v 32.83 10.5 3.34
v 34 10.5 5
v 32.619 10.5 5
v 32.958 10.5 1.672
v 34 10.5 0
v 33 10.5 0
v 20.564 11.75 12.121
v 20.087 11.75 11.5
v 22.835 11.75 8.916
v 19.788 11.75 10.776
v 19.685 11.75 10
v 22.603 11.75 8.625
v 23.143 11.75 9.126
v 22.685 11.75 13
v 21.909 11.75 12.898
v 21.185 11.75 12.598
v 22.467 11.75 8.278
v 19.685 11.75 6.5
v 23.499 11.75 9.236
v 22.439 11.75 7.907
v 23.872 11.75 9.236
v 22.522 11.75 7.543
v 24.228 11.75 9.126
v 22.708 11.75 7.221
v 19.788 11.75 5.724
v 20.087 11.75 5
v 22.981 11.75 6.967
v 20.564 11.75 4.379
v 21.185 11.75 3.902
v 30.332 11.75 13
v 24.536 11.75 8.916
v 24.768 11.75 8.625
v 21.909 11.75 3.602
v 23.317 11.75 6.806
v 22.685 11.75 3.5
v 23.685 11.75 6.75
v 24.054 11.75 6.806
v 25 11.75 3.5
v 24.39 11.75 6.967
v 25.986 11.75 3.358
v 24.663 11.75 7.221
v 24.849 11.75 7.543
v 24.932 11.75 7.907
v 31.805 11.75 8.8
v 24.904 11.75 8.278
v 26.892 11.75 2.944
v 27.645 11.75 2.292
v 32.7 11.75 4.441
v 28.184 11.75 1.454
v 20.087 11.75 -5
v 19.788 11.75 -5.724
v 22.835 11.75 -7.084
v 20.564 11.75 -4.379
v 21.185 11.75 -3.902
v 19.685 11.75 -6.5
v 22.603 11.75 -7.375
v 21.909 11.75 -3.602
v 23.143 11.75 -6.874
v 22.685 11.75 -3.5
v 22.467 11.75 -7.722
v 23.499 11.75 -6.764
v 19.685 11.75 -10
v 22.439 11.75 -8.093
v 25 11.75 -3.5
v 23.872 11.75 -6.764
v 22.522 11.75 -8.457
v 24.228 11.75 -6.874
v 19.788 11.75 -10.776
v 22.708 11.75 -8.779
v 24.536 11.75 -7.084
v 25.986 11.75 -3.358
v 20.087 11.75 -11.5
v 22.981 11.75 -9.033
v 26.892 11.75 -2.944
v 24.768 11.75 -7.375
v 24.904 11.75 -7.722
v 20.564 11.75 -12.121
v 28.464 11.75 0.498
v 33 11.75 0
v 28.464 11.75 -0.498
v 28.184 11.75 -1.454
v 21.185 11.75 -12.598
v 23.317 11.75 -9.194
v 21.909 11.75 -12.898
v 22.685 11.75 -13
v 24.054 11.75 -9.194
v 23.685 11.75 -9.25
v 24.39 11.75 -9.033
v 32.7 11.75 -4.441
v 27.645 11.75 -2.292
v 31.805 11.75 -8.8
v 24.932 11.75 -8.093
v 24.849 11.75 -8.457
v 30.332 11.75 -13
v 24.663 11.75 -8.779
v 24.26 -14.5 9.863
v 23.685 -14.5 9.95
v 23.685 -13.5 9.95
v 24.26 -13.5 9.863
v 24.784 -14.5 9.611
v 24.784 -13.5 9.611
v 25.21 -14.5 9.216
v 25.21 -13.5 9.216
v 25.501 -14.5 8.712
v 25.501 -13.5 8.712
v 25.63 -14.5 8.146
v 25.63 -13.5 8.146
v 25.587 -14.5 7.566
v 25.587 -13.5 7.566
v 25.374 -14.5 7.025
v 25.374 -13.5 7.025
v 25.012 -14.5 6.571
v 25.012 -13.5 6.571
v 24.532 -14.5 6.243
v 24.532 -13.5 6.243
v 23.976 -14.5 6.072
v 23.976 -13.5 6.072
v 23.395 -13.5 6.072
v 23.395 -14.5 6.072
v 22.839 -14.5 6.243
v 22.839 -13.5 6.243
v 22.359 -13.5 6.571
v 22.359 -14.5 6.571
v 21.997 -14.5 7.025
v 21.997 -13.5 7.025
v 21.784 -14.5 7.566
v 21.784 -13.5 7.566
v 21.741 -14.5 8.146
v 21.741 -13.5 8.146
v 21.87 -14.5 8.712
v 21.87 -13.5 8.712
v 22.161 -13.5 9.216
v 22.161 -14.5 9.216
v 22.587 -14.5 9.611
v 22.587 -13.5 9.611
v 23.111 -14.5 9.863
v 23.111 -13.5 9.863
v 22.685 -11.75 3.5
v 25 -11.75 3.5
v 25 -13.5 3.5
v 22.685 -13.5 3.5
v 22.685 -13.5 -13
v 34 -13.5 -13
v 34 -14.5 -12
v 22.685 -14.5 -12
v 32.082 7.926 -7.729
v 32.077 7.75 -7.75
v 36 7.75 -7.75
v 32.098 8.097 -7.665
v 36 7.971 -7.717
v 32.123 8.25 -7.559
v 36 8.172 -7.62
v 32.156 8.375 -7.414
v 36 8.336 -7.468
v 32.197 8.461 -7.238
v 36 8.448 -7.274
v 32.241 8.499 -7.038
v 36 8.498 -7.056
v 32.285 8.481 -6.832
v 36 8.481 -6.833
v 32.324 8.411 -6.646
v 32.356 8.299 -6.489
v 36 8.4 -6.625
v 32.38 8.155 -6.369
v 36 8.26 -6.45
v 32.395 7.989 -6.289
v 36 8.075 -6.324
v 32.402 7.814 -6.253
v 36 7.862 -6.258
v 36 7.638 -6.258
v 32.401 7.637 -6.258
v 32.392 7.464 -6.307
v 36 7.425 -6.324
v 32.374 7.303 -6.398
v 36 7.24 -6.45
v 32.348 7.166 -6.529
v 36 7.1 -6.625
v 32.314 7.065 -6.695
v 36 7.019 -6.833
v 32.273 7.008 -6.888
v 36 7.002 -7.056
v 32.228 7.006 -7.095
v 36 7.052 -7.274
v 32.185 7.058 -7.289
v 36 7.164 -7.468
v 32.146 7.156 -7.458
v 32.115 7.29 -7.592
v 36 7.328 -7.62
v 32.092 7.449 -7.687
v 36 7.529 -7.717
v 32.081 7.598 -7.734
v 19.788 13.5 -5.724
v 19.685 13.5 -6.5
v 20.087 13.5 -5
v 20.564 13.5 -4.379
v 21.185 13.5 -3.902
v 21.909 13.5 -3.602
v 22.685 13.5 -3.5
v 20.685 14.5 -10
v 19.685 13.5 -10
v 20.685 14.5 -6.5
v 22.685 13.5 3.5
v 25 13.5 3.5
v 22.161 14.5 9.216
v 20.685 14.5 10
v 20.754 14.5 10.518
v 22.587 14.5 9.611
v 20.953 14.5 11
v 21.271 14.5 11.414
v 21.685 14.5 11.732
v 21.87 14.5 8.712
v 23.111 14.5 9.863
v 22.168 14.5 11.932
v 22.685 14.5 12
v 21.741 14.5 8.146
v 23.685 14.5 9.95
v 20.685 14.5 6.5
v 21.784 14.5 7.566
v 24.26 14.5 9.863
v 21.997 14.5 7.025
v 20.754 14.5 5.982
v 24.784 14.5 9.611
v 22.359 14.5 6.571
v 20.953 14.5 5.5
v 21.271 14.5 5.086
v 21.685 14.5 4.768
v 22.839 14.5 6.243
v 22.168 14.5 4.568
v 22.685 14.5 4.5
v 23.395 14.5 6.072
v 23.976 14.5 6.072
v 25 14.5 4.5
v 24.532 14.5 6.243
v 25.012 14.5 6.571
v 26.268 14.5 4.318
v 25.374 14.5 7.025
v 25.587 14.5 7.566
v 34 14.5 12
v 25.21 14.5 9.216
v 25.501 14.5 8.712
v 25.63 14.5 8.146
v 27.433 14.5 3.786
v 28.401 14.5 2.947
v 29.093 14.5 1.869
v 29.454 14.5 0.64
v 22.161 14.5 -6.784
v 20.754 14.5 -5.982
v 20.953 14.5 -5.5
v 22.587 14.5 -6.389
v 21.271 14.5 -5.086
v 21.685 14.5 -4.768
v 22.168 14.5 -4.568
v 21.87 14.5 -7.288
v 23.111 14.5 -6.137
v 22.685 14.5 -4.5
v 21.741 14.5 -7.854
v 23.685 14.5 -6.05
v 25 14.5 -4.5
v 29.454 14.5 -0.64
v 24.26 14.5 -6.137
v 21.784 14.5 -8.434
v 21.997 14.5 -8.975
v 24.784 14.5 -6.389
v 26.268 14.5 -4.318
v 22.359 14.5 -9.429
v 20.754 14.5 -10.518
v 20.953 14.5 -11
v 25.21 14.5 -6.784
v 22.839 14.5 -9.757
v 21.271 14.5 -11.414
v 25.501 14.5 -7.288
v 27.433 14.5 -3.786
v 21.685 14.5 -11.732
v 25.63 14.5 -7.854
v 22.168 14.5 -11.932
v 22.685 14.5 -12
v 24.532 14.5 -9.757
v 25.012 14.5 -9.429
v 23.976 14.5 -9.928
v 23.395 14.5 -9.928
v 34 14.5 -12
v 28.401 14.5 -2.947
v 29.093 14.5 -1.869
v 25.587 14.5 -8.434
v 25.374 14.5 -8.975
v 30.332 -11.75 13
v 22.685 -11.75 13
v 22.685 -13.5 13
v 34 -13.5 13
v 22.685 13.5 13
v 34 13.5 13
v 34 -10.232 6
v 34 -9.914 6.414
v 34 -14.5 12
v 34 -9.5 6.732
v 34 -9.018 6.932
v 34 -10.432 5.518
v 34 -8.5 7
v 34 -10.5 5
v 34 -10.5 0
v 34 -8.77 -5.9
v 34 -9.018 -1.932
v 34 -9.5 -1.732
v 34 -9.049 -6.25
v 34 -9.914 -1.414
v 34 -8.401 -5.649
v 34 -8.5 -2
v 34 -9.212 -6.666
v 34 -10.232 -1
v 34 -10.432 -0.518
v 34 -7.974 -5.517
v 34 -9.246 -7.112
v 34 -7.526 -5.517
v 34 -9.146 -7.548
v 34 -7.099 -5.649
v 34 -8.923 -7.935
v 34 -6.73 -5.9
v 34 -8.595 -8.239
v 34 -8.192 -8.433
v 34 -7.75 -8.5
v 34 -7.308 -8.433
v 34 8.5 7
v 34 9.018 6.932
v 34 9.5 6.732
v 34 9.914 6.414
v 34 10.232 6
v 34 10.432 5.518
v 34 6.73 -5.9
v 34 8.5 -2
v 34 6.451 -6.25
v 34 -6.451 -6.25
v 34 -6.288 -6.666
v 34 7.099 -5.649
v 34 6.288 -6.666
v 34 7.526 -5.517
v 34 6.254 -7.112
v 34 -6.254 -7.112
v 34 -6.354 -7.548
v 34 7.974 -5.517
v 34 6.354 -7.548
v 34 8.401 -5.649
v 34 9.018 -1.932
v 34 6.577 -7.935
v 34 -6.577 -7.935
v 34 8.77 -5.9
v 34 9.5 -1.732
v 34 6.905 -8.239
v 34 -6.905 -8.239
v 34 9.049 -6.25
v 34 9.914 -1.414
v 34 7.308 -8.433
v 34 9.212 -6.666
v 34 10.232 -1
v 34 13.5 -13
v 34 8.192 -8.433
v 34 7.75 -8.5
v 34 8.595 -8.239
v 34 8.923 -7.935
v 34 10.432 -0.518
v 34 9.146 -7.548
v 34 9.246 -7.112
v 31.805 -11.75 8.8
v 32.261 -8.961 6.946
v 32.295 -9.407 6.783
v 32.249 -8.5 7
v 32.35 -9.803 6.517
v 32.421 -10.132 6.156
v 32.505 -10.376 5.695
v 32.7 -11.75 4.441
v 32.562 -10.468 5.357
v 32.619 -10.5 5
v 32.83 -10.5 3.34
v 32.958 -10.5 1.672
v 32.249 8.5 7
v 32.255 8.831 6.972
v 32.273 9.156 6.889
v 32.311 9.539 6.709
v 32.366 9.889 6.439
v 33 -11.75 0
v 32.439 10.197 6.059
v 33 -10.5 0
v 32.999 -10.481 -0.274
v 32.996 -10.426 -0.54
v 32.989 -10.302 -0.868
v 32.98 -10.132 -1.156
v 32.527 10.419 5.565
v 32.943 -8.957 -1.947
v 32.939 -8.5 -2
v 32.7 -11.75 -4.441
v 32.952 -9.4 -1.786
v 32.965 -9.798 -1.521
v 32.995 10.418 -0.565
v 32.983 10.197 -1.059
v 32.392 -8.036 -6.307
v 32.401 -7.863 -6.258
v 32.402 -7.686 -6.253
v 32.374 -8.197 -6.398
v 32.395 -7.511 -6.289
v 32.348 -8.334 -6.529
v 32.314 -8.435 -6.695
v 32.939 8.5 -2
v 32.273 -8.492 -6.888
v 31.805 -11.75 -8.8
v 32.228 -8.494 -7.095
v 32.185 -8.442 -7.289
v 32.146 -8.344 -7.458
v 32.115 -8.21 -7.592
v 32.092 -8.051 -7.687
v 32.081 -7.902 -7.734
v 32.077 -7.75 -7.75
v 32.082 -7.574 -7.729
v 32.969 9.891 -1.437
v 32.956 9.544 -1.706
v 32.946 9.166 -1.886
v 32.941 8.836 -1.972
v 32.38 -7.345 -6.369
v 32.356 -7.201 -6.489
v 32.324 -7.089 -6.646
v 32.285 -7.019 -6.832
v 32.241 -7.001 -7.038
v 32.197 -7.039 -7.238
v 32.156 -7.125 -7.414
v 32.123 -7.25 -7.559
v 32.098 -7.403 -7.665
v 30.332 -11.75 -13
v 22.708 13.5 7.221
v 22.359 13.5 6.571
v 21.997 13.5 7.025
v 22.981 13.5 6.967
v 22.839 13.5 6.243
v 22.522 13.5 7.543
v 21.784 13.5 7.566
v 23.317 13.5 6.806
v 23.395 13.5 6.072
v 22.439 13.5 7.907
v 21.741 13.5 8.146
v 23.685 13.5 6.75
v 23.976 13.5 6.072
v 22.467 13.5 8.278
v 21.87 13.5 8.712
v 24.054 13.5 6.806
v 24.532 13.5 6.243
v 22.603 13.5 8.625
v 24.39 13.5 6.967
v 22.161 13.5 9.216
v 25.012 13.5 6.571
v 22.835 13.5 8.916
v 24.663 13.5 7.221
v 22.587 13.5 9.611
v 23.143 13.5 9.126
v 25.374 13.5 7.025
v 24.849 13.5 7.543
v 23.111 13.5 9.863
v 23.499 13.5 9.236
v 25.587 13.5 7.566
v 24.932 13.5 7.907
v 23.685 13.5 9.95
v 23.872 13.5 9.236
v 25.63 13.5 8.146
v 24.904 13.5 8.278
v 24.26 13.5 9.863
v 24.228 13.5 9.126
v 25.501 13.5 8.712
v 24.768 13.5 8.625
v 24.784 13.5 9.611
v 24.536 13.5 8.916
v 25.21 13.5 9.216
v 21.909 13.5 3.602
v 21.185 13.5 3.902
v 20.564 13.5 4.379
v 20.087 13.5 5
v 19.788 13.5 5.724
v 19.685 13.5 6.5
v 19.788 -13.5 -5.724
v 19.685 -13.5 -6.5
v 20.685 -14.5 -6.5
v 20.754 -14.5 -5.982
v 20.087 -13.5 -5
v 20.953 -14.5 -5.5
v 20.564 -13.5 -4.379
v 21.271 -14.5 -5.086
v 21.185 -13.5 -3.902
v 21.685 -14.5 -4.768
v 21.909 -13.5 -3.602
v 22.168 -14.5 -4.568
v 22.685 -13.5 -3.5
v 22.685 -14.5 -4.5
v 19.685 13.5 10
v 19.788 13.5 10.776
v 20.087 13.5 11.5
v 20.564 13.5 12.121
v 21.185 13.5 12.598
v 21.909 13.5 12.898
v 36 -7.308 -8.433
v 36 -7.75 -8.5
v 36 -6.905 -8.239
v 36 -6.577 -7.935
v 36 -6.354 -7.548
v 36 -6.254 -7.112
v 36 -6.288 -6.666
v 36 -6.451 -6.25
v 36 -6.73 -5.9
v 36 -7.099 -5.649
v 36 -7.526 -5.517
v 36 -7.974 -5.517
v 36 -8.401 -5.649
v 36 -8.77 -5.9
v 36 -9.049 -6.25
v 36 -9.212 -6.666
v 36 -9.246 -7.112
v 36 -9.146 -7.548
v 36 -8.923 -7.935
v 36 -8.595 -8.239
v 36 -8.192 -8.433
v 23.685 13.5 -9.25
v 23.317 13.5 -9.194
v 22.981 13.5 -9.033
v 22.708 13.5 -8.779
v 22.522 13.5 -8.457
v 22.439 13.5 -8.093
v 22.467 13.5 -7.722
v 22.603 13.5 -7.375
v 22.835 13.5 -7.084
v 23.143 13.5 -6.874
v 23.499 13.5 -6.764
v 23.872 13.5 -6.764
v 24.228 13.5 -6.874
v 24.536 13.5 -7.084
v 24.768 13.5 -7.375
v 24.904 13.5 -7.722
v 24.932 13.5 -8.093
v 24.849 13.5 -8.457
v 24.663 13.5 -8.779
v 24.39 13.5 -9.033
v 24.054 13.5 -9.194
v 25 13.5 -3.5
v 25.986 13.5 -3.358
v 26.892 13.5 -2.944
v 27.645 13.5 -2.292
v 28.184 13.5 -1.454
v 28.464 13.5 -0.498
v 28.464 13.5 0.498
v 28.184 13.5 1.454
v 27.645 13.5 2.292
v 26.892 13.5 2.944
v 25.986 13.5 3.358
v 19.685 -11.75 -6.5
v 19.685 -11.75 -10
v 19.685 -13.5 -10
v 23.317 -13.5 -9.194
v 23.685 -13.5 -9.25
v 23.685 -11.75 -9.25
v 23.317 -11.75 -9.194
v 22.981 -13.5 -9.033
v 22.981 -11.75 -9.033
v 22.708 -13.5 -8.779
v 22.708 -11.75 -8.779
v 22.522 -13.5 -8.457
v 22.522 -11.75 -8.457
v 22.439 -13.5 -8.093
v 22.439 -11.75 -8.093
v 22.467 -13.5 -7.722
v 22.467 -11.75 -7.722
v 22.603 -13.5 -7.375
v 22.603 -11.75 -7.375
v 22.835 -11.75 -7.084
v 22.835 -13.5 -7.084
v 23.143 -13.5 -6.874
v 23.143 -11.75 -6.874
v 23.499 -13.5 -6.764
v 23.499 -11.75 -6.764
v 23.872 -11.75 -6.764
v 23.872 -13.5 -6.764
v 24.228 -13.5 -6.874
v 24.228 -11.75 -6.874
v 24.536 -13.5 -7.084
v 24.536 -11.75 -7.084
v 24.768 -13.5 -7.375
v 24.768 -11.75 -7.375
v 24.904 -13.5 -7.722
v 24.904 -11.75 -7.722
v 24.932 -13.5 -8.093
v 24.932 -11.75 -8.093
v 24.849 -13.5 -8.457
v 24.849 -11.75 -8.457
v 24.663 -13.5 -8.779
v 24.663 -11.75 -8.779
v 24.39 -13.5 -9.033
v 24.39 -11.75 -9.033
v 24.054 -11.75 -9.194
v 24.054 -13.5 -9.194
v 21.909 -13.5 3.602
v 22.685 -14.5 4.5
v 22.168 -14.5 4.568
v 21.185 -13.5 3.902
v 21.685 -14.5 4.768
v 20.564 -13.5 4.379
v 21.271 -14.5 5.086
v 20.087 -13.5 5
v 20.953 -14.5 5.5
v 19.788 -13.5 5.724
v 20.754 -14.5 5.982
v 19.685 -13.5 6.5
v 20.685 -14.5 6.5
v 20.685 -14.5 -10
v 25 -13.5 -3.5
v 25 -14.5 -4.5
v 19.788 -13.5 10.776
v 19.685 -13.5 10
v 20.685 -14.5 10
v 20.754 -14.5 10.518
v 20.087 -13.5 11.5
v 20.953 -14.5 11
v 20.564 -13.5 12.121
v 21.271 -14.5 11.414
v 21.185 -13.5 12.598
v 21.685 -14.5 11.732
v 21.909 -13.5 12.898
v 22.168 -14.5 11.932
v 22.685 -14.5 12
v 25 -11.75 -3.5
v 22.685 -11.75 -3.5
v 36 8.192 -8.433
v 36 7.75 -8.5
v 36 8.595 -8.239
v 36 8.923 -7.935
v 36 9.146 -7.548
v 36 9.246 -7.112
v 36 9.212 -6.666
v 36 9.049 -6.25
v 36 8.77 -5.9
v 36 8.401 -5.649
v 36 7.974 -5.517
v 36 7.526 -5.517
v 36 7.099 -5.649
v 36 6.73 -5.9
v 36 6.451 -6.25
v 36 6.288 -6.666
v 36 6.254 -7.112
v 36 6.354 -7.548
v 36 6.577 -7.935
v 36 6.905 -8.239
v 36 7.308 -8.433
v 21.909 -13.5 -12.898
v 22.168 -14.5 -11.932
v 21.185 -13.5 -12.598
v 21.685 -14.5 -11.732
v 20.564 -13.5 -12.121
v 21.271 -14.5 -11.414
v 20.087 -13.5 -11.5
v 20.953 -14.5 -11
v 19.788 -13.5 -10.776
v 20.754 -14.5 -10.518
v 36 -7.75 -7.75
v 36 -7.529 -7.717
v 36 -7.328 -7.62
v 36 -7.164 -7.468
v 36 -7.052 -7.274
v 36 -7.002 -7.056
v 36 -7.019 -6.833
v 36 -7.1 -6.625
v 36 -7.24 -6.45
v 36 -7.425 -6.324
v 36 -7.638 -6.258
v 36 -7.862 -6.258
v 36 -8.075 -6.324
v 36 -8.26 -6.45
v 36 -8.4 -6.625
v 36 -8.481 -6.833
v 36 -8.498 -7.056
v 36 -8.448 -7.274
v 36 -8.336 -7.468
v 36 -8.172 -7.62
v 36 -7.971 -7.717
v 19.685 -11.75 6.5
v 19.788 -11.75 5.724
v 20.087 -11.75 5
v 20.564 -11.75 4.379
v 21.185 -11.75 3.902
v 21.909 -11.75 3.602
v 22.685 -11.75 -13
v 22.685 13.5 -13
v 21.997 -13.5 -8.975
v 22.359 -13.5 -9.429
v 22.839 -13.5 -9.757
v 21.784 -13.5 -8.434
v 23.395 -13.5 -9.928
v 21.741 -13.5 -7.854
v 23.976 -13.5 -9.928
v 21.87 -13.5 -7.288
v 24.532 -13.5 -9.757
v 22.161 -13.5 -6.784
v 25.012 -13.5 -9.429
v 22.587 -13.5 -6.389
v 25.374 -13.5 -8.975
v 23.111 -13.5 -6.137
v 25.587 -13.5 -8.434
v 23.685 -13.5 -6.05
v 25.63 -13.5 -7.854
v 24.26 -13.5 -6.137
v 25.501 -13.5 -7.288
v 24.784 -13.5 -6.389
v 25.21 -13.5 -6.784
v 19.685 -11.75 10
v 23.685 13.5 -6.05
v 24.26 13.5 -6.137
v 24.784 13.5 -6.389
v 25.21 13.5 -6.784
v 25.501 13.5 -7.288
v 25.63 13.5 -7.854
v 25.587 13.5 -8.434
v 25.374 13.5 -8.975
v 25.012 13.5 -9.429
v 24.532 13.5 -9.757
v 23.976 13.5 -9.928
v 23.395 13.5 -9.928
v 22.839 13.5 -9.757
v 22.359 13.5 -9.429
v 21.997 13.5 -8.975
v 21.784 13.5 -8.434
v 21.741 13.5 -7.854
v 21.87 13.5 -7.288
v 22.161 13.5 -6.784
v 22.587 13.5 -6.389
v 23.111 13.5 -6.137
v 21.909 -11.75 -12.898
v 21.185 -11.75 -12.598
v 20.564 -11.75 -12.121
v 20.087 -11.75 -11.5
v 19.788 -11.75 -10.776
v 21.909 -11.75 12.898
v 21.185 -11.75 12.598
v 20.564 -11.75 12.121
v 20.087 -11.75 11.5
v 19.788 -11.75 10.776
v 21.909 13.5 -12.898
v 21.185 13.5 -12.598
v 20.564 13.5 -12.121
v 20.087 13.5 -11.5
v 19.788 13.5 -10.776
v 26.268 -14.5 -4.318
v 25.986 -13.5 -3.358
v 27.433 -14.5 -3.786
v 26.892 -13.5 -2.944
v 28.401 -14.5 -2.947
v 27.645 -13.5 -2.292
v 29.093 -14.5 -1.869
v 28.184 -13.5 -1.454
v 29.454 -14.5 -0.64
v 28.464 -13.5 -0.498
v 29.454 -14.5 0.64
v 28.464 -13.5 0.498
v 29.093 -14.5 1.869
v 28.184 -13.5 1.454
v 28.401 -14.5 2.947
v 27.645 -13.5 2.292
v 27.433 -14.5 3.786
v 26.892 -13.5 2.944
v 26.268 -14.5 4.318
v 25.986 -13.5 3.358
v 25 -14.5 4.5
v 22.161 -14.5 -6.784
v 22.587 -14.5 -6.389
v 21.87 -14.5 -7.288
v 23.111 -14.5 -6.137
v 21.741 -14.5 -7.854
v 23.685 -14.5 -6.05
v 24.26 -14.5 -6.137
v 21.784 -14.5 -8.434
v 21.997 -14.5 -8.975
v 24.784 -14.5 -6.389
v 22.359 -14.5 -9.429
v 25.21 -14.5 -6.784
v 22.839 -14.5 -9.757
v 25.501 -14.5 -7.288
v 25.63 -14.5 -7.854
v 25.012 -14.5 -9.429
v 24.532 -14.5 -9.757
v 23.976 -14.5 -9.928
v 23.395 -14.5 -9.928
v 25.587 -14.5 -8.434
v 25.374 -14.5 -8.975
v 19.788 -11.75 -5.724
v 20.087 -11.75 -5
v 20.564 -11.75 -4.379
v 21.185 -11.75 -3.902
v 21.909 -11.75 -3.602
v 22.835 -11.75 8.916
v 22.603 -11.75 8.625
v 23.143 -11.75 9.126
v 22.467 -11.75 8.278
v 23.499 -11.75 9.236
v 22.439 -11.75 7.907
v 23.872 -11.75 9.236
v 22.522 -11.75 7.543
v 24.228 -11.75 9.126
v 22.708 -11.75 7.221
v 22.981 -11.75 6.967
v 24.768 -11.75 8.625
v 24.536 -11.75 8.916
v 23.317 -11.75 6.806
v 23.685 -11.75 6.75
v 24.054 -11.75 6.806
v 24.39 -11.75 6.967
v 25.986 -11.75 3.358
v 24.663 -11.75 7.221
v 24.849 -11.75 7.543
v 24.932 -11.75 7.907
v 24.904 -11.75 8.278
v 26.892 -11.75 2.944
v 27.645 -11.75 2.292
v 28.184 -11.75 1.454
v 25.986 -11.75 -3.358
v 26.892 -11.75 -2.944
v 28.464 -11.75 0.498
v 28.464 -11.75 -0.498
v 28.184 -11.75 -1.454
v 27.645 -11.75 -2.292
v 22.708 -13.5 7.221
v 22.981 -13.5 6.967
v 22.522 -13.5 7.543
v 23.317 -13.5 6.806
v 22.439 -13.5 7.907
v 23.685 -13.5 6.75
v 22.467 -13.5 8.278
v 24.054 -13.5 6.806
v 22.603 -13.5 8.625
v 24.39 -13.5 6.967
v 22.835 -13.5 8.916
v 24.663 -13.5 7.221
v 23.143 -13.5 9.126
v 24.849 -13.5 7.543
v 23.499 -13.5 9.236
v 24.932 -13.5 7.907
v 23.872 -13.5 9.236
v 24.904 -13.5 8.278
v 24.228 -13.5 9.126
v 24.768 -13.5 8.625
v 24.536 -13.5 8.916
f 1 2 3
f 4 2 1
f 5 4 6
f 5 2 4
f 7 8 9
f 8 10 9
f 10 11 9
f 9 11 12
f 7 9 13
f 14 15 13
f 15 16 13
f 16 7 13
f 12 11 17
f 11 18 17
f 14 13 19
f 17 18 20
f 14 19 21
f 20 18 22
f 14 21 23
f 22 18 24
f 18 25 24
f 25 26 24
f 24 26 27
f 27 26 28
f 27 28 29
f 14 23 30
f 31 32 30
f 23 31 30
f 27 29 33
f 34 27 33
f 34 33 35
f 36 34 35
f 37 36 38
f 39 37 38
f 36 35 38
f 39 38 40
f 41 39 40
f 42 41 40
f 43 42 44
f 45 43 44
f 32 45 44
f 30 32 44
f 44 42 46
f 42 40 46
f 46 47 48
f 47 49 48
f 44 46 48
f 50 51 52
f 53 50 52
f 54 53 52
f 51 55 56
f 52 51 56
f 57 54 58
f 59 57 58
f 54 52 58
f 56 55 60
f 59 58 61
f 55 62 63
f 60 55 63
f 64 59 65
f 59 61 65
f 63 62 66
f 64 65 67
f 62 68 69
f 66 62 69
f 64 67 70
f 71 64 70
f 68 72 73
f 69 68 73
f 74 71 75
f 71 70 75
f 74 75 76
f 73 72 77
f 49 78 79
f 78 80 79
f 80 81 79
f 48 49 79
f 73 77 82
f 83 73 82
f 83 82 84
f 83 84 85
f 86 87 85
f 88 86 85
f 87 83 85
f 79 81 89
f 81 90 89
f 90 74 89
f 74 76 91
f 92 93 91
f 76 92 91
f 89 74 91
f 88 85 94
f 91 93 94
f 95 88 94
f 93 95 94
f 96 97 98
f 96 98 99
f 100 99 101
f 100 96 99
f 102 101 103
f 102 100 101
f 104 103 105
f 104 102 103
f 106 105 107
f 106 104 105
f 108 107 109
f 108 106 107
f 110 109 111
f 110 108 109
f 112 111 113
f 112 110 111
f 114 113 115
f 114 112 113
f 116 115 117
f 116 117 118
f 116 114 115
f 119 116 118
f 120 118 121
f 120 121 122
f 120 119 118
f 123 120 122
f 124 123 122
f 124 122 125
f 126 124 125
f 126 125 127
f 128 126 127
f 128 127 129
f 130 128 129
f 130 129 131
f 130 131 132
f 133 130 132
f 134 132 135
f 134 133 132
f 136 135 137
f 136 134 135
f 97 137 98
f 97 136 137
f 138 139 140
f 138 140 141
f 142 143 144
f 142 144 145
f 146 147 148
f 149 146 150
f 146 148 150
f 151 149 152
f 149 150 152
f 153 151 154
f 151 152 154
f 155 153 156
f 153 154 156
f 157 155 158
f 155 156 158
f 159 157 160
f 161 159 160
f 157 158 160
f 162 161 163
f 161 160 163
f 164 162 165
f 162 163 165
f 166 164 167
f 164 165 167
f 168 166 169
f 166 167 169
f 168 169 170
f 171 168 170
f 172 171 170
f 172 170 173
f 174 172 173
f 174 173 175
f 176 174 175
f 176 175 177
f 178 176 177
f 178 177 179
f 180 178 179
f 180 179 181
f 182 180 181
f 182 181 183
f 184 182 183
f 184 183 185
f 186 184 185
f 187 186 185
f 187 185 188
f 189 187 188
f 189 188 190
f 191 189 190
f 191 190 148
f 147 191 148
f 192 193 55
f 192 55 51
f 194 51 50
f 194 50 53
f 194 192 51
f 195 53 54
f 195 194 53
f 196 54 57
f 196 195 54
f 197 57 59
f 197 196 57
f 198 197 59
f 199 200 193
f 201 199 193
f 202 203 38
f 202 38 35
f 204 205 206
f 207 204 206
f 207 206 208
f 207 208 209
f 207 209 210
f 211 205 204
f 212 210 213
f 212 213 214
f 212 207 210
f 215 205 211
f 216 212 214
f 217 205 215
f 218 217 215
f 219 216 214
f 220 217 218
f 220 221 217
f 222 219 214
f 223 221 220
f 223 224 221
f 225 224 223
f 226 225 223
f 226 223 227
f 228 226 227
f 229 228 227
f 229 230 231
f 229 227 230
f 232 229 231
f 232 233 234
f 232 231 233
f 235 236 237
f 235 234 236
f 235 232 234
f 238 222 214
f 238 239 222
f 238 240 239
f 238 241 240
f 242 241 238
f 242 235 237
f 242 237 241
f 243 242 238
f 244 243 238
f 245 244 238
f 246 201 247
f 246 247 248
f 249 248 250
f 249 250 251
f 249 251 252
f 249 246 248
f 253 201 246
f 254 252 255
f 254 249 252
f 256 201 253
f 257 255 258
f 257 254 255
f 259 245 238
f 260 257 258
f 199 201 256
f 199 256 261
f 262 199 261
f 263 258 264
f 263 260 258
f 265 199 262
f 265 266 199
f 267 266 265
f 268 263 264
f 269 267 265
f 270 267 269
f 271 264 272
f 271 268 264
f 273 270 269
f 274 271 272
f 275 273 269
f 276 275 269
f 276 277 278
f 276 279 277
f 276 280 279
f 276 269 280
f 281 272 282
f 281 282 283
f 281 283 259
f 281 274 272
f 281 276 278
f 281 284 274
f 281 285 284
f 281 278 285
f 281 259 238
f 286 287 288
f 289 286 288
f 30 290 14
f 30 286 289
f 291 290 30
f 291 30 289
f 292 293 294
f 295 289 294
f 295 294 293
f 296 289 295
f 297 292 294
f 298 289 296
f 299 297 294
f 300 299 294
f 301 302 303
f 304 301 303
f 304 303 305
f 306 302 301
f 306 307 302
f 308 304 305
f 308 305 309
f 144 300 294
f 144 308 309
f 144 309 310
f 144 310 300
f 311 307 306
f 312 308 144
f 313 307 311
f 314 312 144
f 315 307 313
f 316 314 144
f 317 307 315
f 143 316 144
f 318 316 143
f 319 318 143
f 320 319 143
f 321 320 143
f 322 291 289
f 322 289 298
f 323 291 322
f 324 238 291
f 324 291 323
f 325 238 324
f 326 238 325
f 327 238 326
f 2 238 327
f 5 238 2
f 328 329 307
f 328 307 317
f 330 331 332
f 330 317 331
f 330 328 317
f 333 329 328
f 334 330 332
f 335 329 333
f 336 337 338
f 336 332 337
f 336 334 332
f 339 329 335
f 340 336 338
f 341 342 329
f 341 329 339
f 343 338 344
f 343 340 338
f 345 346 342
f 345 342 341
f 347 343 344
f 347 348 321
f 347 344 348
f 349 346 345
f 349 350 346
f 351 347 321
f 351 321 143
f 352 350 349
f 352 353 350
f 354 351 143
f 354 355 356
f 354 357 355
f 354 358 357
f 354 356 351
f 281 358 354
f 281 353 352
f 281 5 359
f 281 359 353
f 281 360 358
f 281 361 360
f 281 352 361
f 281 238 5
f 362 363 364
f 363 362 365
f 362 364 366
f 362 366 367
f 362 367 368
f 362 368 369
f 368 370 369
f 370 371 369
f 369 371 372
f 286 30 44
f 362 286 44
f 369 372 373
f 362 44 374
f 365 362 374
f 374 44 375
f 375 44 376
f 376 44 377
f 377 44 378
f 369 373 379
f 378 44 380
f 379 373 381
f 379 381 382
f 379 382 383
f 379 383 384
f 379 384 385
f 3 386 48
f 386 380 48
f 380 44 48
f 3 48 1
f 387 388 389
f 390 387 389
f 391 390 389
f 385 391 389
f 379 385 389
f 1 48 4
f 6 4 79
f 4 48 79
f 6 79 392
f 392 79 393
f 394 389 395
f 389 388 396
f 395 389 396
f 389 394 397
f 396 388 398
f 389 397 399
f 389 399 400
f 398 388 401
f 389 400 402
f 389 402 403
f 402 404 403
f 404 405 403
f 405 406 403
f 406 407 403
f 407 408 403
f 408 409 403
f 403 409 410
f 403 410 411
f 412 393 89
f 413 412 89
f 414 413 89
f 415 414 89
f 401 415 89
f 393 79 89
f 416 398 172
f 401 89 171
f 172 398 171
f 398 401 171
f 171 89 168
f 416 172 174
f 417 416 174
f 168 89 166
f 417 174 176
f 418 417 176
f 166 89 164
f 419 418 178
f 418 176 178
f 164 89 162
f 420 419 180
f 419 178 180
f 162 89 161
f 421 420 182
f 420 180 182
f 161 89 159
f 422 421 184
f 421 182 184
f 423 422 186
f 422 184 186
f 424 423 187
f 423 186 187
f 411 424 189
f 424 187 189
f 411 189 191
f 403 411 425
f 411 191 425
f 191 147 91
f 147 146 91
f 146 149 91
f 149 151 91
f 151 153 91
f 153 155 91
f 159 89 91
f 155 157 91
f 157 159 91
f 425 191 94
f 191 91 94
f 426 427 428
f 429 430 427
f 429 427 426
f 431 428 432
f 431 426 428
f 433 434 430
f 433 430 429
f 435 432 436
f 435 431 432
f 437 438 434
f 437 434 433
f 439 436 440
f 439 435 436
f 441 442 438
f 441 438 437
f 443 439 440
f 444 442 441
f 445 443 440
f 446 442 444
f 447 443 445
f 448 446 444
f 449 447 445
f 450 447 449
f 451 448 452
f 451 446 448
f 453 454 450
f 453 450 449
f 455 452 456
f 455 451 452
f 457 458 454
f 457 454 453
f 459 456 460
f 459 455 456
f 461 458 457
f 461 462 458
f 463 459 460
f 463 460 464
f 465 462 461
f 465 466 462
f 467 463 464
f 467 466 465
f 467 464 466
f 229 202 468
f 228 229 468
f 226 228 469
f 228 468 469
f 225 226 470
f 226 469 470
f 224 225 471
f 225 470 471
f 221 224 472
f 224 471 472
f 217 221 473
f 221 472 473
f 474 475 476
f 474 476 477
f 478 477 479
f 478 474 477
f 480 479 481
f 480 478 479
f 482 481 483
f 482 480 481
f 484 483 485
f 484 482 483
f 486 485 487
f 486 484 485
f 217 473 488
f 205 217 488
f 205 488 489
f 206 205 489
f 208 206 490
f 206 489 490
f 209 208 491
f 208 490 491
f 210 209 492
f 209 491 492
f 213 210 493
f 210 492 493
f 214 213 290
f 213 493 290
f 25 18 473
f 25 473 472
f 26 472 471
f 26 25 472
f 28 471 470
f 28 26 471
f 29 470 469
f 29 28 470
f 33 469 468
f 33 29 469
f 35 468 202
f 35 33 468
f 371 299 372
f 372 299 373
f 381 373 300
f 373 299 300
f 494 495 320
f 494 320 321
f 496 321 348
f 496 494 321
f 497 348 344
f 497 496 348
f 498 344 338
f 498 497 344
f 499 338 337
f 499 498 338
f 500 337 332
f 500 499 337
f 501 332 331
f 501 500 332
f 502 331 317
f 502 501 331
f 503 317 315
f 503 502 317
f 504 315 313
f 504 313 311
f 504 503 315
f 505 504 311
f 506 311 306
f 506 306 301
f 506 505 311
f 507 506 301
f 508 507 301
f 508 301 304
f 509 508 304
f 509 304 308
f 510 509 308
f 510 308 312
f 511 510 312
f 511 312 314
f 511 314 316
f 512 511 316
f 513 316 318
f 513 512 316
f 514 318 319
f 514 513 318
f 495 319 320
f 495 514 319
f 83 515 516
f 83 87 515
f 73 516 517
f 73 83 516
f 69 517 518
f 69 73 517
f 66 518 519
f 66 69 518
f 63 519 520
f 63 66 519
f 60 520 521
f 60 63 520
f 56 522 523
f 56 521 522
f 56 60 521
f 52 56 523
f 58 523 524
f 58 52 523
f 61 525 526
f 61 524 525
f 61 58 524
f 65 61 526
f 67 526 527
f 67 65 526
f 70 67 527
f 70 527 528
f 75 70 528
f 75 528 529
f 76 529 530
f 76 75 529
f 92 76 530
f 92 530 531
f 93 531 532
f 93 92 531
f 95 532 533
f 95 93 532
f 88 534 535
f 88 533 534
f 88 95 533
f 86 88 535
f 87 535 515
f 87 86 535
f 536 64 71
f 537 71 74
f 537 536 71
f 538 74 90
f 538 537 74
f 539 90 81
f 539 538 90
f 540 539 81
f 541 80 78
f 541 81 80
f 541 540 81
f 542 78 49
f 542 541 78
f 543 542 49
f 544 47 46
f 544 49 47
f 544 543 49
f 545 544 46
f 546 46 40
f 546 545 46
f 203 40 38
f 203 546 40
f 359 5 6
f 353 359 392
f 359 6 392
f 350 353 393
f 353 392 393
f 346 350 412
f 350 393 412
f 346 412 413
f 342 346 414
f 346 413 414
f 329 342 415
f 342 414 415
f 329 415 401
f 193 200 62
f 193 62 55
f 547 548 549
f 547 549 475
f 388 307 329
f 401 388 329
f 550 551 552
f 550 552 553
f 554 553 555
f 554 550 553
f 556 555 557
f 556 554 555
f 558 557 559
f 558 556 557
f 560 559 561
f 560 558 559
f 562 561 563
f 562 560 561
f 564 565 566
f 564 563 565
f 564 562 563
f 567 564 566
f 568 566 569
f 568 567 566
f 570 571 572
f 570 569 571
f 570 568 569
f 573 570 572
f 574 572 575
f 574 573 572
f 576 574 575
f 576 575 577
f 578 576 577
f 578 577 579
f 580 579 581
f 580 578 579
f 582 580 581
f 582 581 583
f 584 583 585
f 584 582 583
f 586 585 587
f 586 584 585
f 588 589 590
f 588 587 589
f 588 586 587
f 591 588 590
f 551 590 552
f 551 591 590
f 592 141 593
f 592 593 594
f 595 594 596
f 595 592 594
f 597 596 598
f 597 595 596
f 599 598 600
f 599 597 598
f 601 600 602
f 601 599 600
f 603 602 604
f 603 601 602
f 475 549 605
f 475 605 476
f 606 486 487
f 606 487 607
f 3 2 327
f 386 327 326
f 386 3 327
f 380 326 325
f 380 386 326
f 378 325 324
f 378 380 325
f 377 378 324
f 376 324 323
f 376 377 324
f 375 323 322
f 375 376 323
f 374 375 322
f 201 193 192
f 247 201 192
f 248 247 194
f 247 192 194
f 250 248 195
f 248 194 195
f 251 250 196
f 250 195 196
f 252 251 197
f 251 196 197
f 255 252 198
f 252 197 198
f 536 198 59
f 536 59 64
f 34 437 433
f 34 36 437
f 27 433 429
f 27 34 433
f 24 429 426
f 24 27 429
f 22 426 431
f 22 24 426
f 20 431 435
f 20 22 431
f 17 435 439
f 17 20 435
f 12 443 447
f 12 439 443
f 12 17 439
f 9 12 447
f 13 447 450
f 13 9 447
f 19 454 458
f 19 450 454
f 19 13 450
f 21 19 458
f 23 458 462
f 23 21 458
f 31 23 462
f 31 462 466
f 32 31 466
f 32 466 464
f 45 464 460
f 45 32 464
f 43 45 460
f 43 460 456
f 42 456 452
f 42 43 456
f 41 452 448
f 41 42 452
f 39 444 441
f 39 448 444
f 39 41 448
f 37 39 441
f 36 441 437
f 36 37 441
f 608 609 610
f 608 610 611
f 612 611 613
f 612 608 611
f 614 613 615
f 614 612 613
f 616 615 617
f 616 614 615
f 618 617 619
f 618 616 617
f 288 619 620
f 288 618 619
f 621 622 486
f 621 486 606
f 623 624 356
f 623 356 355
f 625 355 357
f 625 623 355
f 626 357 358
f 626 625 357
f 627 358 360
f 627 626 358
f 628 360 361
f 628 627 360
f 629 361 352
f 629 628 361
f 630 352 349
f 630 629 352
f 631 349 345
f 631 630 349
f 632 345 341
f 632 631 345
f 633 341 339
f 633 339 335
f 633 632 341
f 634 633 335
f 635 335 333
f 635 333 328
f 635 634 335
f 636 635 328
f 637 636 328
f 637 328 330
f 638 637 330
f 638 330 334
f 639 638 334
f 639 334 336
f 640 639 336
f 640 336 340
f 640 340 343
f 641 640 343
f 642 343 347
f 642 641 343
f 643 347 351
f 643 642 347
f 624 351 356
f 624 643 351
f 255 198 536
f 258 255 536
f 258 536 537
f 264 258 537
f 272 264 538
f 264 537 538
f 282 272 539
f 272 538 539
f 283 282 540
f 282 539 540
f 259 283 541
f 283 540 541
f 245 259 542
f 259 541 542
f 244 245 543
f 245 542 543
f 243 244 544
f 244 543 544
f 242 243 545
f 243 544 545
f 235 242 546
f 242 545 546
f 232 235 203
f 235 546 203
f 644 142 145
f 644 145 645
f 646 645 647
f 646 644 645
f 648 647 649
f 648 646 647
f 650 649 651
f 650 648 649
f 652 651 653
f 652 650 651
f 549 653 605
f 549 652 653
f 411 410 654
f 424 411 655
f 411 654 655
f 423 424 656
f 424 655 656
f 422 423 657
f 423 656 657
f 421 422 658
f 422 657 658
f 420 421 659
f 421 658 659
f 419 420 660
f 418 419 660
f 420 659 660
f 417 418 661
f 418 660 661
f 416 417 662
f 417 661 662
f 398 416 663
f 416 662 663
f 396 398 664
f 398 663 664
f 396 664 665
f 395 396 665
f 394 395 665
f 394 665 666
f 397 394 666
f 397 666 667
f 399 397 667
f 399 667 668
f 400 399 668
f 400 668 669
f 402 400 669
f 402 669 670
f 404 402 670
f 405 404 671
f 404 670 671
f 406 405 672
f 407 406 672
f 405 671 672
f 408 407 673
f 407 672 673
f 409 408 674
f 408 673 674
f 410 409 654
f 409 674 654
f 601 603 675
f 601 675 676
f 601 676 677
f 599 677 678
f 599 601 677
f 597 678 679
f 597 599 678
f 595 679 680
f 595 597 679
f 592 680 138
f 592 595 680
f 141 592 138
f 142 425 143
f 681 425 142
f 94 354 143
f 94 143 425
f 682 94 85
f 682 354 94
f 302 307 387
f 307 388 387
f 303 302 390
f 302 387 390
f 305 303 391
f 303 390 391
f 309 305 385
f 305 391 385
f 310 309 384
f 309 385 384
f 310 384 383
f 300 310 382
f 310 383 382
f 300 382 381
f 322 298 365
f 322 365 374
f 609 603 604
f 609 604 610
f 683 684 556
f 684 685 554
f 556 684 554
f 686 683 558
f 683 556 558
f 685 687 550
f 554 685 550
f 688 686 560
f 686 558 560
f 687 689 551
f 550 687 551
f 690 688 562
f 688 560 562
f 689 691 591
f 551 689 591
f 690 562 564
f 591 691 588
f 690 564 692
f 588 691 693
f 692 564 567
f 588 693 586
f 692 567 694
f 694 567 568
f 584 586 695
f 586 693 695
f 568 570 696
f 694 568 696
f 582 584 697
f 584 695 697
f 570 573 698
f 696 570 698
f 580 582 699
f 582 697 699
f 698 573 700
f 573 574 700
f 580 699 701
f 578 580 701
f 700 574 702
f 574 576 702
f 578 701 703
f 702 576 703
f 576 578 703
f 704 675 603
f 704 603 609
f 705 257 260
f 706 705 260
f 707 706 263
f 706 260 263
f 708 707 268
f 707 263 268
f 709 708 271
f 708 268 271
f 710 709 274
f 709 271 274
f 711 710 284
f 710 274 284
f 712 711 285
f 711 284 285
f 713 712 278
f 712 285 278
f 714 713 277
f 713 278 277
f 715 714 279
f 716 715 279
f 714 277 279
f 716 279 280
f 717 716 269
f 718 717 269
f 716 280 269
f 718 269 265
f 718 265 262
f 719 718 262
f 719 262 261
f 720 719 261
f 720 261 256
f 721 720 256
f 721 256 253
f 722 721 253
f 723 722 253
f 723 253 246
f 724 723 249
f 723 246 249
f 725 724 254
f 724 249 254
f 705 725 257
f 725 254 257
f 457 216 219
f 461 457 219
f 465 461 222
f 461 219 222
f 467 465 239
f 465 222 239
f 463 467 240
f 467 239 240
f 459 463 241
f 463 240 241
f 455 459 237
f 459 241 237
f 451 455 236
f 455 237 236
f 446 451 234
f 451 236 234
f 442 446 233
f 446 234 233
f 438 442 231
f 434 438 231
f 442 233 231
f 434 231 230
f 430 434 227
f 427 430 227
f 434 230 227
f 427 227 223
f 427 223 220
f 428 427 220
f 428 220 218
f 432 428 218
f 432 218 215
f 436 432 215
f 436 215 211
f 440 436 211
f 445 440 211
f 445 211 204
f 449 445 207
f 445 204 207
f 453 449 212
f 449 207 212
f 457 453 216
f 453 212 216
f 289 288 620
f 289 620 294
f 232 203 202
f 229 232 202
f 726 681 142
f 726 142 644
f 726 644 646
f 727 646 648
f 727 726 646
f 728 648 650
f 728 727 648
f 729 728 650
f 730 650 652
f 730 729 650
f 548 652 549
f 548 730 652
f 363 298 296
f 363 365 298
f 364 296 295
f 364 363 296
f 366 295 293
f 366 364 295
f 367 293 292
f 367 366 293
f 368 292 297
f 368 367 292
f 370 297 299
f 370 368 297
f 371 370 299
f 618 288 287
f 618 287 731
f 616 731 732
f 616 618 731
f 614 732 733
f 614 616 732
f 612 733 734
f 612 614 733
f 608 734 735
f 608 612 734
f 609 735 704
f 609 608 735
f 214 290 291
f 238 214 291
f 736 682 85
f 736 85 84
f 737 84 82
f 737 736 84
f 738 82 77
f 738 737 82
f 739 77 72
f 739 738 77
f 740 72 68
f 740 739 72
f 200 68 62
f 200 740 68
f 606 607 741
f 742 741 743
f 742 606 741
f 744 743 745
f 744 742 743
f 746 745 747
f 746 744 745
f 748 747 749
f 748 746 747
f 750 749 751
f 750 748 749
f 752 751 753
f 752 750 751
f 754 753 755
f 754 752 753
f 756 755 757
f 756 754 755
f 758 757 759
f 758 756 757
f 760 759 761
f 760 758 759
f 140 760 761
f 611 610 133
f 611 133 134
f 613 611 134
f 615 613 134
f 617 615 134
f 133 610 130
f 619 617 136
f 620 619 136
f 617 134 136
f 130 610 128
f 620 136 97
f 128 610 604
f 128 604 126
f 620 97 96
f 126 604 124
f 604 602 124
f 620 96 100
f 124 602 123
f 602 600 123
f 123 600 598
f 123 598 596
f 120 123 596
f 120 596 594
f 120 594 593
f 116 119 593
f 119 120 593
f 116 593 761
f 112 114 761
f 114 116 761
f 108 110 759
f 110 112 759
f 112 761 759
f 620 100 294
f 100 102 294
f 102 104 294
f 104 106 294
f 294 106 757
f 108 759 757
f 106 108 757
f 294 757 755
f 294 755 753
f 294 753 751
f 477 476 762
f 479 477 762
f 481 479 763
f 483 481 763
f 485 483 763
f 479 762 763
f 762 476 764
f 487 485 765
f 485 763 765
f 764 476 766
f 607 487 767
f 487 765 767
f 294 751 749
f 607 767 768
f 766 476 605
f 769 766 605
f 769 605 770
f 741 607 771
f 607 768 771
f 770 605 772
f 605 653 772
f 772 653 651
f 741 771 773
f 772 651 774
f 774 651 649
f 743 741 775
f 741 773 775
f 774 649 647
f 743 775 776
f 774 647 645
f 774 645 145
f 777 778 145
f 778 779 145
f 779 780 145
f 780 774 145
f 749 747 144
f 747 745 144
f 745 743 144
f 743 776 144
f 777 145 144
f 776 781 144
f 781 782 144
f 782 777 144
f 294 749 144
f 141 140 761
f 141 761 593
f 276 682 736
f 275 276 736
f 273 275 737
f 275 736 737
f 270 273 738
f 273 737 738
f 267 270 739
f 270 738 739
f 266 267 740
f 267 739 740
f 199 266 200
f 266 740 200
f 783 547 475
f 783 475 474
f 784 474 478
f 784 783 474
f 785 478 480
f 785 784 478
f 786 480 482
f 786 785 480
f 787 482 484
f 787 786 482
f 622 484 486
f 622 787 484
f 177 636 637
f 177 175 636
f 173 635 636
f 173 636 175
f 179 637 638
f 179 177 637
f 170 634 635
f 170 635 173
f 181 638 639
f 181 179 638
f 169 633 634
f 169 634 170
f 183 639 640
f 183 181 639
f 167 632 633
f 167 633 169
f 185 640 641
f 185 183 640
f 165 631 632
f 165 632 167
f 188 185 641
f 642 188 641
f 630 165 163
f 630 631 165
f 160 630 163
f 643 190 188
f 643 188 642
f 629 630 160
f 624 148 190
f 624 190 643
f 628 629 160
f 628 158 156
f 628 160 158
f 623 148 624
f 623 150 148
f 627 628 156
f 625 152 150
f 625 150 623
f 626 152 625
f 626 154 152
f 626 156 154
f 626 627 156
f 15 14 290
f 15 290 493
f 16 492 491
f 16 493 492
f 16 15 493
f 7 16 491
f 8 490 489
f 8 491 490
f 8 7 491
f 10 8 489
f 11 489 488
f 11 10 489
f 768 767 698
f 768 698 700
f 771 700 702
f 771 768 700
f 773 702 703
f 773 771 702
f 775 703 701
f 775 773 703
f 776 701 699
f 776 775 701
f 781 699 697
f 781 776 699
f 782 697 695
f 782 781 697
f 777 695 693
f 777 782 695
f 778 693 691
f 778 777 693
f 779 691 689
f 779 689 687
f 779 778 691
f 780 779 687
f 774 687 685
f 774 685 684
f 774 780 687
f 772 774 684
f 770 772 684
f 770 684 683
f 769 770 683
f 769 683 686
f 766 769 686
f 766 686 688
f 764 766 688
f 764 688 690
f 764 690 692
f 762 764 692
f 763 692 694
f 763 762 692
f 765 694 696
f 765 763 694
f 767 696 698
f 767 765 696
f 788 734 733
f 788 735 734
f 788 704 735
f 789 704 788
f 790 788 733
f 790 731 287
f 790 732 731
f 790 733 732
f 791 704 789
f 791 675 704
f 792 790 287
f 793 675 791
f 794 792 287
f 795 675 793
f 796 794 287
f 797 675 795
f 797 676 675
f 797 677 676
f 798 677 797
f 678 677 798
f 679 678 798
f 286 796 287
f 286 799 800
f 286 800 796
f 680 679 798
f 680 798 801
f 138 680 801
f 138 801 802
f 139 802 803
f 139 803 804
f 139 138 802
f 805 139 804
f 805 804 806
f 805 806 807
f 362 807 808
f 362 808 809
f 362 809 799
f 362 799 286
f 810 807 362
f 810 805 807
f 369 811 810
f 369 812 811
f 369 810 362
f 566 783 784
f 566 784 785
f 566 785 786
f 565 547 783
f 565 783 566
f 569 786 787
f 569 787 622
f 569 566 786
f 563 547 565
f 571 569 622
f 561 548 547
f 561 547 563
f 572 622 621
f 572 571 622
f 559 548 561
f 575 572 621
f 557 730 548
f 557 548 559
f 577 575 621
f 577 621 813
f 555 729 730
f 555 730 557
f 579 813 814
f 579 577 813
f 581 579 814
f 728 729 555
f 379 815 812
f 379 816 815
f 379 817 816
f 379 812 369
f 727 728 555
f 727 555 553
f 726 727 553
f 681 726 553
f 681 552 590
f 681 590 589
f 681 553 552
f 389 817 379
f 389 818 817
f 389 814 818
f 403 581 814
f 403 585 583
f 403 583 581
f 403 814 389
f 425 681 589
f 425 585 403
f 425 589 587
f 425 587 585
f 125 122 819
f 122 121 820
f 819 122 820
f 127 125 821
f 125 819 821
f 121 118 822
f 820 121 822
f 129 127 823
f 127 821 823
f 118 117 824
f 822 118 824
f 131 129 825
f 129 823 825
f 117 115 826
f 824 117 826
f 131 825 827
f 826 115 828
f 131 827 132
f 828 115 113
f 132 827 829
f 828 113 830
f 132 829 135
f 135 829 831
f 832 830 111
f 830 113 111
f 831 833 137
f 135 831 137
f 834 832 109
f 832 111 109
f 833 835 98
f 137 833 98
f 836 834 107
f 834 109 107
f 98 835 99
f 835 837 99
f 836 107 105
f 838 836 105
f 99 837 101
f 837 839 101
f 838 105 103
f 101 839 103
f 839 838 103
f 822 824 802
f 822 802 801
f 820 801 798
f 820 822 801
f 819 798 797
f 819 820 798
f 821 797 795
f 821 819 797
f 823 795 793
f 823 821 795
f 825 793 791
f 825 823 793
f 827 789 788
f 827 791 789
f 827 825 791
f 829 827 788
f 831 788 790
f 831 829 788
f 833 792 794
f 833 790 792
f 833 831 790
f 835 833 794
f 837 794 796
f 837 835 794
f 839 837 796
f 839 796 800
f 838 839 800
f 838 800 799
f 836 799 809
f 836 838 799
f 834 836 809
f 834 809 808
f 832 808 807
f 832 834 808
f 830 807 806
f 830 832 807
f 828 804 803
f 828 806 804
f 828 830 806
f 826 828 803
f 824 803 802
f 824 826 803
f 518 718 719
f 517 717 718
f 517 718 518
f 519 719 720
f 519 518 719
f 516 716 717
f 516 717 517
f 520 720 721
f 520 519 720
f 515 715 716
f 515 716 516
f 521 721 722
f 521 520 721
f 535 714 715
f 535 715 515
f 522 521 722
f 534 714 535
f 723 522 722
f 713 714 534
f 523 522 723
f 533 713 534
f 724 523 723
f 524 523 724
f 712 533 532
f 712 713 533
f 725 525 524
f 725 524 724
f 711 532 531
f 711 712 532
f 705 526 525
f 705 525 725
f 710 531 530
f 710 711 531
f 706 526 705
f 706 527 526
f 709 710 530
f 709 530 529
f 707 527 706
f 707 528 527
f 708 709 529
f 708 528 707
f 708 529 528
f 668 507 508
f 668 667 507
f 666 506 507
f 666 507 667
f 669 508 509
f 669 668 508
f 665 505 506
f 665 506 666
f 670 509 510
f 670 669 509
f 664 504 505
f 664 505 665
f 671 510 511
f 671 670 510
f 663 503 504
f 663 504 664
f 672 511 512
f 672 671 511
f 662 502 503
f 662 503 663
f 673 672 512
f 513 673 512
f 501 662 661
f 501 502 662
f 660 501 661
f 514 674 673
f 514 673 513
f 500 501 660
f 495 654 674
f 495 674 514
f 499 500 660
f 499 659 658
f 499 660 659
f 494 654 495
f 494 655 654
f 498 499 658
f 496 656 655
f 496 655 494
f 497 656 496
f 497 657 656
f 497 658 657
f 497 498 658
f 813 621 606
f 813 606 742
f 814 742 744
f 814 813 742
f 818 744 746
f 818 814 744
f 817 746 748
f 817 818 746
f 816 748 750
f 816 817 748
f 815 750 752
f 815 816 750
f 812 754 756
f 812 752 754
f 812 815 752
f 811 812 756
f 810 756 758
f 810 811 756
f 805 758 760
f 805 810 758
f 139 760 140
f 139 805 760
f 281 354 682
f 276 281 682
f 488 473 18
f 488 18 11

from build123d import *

# Parameters (mm, degrees)
SKETCH_1_R          = 1.25
EXTRUDE_1_DEPTH     = 14.5
SKETCH_2_R          = 33
CUT_EXTRUDE_1_DEPTH = 11.75
SKETCH_3_R          = 0.75
SKETCH_3_W          = 9
SKETCH_3_H          = 21
CUT_EXTRUDE_2_DEPTH = 25.169333236
EXTRUDE_START       = 2
SKETCH_4_R          = 1.5
SKETCH_4_R_2        = 0.75
EXTRUDE_2_DEPTH     = 2
FILLET_1_R          = 2
FILLET_2_R          = 3
CHAMFER_1_SIZE      = 1
SKETCH_5_R          = 1.95
CUT_EXTRUDE_3_DEPTH = 1


with BuildPart() as part:
    # Эскиз1 → Бобышка-Вытянуть1 (new, symmetric)
    with BuildSketch(Plane(origin=(0, 0, 0), x_dir=(1, 0, 0), z_dir=(0, 1, 0))):
        with BuildLine():
            Line((34, 13), (19.685438565, 13))
            Line((19.685438565, 13), (19.685438565, 3.5))
            Line((19.685438565, 3.5), (25, 3.5))
            ThreePointArc((25, 3.5), (27.474873734, 2.474873734), (28.5, 0))
            ThreePointArc((28.5, 0), (27.474873734, -2.474873734), (25, -3.5))
            Line((25, -3.5), (19.685438565, -3.5))
            Line((19.685438565, -3.5), (19.685438565, -13))
            Line((19.685438565, -13), (34, -13))
            Line((34, -13), (34, 13))
        make_face()
        with Locations(Location((23.685438565, -8, 0), (0, 0, 90))):
            Circle(SKETCH_1_R, mode=Mode.SUBTRACT)
        with Locations(Location((23.685438565, 8, 0), (0, 0, 90))):
            Circle(SKETCH_1_R, mode=Mode.SUBTRACT)
    extrude(amount=EXTRUDE_1_DEPTH, both=True)

    # Эскиз2 → Вырез-Вытянуть1 (cut, symmetric)
    with BuildSketch(Plane(origin=(0, 0, 0), x_dir=(1, 0, 0), z_dir=(0, 1, 0))):
        Circle(SKETCH_2_R)
    extrude(amount=CUT_EXTRUDE_1_DEPTH, both=True, mode=Mode.SUBTRACT)

    # Эскиз3 → Вырез-Вытянуть2 (cut, through all)
    with BuildSketch(Plane(origin=(34, 0, 0), x_dir=(0, 0, -1), z_dir=(1, 0, 0))):
        with Locations((7, 7.75)):
            Circle(SKETCH_3_R)
        with Locations((7, -7.75)):
            Circle(SKETCH_3_R)
        with Locations((-2.5, 0)):
            Rectangle(SKETCH_3_W, SKETCH_3_H)
    extrude(amount=-CUT_EXTRUDE_2_DEPTH, mode=Mode.SUBTRACT)

    # Эскиз4 → Бобышка-Вытянуть2 (add)
    # profile 1 of 2: a face of its own
    with BuildSketch(Plane(origin=(34, 0, 0), x_dir=(0, 0, -1), z_dir=(1, 0, 0)).offset(EXTRUDE_START)):
        with Locations((7, 7.75)):
            Circle(SKETCH_4_R)
        with Locations((7, 7.75)):
            Circle(SKETCH_4_R_2, mode=Mode.SUBTRACT)
    # profile 2 of 2: a face of its own
    with BuildSketch(Plane(origin=(34, 0, 0), x_dir=(0, 0, -1), z_dir=(1, 0, 0)).offset(EXTRUDE_START)):
        with Locations((7, -7.75)):
            Circle(SKETCH_4_R)
        with Locations((7, -7.75)):
            Circle(SKETCH_4_R_2, mode=Mode.SUBTRACT)
    extrude(amount=-EXTRUDE_2_DEPTH)

    # Скругление1
    fillet_1_edges = [part.edges().sort_by_distance(p)[0] for p in [
        (33.469669092, 10.5, -2),
        (33.469669092, -10.5, -2),
        (33.124515497, -10.5, 7),
        (33.124515497, 10.5, 7),
    ]]
    fillet(fillet_1_edges, radius=FILLET_1_R)

    # Скругление2
    fillet_2_edges = [part.edges().sort_by_distance(p)[0] for p in [
        (19.685438565, 13.125, -3.5),
        (19.685438565, 13.125, -13),
        (19.685438565, 13.125, 13),
        (19.685438565, 13.125, 3.5),
        (19.685438565, -13.125, -3.5),
        (19.685438565, -13.125, -13),
        (19.685438565, -13.125, 13),
        (19.685438565, -13.125, 3.5),
    ]]
    fillet(fillet_2_edges, radius=FILLET_2_R)

    # Фаска1
    chamfer_1_edges = [part.edges().sort_by_distance(p)[0] for p in [
        (19.685438565, -14.5, -8.25),
        (23.842719282, 14.5, 3.5),
        (23.842719282, -14.5, -3.5),
        (28.342719282, -14.5, -13),
        (28.342719282, -14.5, 13),
        (19.685438565, -14.5, 8.25),
        (20.564118221, -14.5, 12.121320344),
        (20.564118221, -14.5, 4.378679656),
        (20.564118221, -14.5, -4.378679656),
        (20.564118221, -14.5, -12.121320344),
        (28.342719282, 14.5, -13),
        (28.342719282, 14.5, 13),
        (19.685438565, 14.5, -8.25),
        (19.685438565, 14.5, 8.25),
        (20.564118221, 14.5, 12.121320344),
        (20.564118221, 14.5, 4.378679656),
        (20.564118221, 14.5, -4.378679656),
        (20.564118221, 14.5, -12.121320344),
        (23.842719282, -14.5, 3.5),
        (28.5, -14.5, 0),
        (23.842719282, 14.5, -3.5),
        (28.5, 14.5, 0),
    ]]
    chamfer(chamfer_1_edges, length=CHAMFER_1_SIZE)

    # Эскиз5 → Вырез-Вытянуть3 (cut)
    with BuildSketch(Plane(origin=(0, 14.5, 0), x_dir=(1, 0, 0), z_dir=(0, 1, 0))):
        with Locations(Location((23.685438565, -8, 0), (0, 0, 270))):
            Circle(SKETCH_5_R)
        with Locations(Location((23.685438565, 8, 0), (0, 0, 270))):
            Circle(SKETCH_5_R)
    cut_extrude_3 = extrude(amount=-CUT_EXTRUDE_3_DEPTH, mode=Mode.SUBTRACT)

    # Зеркальное отражение1: Вырез-Вытянуть3 across plane
    add(cut_extrude_3.mirror(Plane.ZX), mode=Mode.SUBTRACT)


solid = part.part
